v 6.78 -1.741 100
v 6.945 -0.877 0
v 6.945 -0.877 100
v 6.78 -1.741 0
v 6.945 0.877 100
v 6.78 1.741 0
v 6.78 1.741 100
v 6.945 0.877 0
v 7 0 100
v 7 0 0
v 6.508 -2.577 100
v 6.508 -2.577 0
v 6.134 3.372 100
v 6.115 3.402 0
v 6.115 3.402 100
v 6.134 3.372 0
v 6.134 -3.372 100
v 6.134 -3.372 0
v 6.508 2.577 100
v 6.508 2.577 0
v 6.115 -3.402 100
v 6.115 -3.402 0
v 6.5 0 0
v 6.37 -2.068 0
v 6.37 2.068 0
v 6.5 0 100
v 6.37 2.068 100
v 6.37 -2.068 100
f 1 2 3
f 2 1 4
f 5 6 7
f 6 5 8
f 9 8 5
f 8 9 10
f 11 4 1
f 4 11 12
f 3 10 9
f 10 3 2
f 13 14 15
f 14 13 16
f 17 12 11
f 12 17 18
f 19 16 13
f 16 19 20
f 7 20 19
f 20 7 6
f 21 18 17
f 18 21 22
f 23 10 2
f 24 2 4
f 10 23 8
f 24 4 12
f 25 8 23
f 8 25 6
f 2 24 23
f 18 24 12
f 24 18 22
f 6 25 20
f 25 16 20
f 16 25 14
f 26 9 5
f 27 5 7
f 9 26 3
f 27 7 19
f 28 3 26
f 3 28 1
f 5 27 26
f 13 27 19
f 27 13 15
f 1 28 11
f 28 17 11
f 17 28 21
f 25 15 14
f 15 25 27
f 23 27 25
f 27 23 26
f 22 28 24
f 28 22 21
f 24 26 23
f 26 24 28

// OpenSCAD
$fn = 50;


difference() {
	union() {
		cylinder(h = 100, r = 7.0000000000);
		translate(v = [-13.0000000000, 0, 0]) {
			cylinder(h = 100, r = 7.0000000000);
		}
	}
	union() {
		cylinder(h = 100, r = 3.2500000000);
		cylinder(h = 100, r = 1.8000000000);
		cylinder(h = 100, r = 1.8000000000);
		cylinder(h = 100, r = 1.8000000000);
		translate(v = [-17.5000000000, 0, 0]) {
			hull() {
				translate(v = [-3.7500000000, 0.0000000000, 0]) {
					cylinder(h = 100, r = 7.5000000000);
				}
				translate(v = [3.7500000000, 0.0000000000, 0]) {
					cylinder(h = 100, r = 7.5000000000);
				}
				translate(v = [-3.7500000000, -0.0000000000, 0]) {
					cylinder(h = 100, r = 7.5000000000);
				}
				translate(v = [3.7500000000, -0.0000000000, 0]) {
					cylinder(h = 100, r = 7.5000000000);
				}
			}
		}
		translate(v = [-10.0000000000, 0, 0.0000000000]) {
			cylinder(h = 100, r = 16.5000000000);
		}
	}
}
